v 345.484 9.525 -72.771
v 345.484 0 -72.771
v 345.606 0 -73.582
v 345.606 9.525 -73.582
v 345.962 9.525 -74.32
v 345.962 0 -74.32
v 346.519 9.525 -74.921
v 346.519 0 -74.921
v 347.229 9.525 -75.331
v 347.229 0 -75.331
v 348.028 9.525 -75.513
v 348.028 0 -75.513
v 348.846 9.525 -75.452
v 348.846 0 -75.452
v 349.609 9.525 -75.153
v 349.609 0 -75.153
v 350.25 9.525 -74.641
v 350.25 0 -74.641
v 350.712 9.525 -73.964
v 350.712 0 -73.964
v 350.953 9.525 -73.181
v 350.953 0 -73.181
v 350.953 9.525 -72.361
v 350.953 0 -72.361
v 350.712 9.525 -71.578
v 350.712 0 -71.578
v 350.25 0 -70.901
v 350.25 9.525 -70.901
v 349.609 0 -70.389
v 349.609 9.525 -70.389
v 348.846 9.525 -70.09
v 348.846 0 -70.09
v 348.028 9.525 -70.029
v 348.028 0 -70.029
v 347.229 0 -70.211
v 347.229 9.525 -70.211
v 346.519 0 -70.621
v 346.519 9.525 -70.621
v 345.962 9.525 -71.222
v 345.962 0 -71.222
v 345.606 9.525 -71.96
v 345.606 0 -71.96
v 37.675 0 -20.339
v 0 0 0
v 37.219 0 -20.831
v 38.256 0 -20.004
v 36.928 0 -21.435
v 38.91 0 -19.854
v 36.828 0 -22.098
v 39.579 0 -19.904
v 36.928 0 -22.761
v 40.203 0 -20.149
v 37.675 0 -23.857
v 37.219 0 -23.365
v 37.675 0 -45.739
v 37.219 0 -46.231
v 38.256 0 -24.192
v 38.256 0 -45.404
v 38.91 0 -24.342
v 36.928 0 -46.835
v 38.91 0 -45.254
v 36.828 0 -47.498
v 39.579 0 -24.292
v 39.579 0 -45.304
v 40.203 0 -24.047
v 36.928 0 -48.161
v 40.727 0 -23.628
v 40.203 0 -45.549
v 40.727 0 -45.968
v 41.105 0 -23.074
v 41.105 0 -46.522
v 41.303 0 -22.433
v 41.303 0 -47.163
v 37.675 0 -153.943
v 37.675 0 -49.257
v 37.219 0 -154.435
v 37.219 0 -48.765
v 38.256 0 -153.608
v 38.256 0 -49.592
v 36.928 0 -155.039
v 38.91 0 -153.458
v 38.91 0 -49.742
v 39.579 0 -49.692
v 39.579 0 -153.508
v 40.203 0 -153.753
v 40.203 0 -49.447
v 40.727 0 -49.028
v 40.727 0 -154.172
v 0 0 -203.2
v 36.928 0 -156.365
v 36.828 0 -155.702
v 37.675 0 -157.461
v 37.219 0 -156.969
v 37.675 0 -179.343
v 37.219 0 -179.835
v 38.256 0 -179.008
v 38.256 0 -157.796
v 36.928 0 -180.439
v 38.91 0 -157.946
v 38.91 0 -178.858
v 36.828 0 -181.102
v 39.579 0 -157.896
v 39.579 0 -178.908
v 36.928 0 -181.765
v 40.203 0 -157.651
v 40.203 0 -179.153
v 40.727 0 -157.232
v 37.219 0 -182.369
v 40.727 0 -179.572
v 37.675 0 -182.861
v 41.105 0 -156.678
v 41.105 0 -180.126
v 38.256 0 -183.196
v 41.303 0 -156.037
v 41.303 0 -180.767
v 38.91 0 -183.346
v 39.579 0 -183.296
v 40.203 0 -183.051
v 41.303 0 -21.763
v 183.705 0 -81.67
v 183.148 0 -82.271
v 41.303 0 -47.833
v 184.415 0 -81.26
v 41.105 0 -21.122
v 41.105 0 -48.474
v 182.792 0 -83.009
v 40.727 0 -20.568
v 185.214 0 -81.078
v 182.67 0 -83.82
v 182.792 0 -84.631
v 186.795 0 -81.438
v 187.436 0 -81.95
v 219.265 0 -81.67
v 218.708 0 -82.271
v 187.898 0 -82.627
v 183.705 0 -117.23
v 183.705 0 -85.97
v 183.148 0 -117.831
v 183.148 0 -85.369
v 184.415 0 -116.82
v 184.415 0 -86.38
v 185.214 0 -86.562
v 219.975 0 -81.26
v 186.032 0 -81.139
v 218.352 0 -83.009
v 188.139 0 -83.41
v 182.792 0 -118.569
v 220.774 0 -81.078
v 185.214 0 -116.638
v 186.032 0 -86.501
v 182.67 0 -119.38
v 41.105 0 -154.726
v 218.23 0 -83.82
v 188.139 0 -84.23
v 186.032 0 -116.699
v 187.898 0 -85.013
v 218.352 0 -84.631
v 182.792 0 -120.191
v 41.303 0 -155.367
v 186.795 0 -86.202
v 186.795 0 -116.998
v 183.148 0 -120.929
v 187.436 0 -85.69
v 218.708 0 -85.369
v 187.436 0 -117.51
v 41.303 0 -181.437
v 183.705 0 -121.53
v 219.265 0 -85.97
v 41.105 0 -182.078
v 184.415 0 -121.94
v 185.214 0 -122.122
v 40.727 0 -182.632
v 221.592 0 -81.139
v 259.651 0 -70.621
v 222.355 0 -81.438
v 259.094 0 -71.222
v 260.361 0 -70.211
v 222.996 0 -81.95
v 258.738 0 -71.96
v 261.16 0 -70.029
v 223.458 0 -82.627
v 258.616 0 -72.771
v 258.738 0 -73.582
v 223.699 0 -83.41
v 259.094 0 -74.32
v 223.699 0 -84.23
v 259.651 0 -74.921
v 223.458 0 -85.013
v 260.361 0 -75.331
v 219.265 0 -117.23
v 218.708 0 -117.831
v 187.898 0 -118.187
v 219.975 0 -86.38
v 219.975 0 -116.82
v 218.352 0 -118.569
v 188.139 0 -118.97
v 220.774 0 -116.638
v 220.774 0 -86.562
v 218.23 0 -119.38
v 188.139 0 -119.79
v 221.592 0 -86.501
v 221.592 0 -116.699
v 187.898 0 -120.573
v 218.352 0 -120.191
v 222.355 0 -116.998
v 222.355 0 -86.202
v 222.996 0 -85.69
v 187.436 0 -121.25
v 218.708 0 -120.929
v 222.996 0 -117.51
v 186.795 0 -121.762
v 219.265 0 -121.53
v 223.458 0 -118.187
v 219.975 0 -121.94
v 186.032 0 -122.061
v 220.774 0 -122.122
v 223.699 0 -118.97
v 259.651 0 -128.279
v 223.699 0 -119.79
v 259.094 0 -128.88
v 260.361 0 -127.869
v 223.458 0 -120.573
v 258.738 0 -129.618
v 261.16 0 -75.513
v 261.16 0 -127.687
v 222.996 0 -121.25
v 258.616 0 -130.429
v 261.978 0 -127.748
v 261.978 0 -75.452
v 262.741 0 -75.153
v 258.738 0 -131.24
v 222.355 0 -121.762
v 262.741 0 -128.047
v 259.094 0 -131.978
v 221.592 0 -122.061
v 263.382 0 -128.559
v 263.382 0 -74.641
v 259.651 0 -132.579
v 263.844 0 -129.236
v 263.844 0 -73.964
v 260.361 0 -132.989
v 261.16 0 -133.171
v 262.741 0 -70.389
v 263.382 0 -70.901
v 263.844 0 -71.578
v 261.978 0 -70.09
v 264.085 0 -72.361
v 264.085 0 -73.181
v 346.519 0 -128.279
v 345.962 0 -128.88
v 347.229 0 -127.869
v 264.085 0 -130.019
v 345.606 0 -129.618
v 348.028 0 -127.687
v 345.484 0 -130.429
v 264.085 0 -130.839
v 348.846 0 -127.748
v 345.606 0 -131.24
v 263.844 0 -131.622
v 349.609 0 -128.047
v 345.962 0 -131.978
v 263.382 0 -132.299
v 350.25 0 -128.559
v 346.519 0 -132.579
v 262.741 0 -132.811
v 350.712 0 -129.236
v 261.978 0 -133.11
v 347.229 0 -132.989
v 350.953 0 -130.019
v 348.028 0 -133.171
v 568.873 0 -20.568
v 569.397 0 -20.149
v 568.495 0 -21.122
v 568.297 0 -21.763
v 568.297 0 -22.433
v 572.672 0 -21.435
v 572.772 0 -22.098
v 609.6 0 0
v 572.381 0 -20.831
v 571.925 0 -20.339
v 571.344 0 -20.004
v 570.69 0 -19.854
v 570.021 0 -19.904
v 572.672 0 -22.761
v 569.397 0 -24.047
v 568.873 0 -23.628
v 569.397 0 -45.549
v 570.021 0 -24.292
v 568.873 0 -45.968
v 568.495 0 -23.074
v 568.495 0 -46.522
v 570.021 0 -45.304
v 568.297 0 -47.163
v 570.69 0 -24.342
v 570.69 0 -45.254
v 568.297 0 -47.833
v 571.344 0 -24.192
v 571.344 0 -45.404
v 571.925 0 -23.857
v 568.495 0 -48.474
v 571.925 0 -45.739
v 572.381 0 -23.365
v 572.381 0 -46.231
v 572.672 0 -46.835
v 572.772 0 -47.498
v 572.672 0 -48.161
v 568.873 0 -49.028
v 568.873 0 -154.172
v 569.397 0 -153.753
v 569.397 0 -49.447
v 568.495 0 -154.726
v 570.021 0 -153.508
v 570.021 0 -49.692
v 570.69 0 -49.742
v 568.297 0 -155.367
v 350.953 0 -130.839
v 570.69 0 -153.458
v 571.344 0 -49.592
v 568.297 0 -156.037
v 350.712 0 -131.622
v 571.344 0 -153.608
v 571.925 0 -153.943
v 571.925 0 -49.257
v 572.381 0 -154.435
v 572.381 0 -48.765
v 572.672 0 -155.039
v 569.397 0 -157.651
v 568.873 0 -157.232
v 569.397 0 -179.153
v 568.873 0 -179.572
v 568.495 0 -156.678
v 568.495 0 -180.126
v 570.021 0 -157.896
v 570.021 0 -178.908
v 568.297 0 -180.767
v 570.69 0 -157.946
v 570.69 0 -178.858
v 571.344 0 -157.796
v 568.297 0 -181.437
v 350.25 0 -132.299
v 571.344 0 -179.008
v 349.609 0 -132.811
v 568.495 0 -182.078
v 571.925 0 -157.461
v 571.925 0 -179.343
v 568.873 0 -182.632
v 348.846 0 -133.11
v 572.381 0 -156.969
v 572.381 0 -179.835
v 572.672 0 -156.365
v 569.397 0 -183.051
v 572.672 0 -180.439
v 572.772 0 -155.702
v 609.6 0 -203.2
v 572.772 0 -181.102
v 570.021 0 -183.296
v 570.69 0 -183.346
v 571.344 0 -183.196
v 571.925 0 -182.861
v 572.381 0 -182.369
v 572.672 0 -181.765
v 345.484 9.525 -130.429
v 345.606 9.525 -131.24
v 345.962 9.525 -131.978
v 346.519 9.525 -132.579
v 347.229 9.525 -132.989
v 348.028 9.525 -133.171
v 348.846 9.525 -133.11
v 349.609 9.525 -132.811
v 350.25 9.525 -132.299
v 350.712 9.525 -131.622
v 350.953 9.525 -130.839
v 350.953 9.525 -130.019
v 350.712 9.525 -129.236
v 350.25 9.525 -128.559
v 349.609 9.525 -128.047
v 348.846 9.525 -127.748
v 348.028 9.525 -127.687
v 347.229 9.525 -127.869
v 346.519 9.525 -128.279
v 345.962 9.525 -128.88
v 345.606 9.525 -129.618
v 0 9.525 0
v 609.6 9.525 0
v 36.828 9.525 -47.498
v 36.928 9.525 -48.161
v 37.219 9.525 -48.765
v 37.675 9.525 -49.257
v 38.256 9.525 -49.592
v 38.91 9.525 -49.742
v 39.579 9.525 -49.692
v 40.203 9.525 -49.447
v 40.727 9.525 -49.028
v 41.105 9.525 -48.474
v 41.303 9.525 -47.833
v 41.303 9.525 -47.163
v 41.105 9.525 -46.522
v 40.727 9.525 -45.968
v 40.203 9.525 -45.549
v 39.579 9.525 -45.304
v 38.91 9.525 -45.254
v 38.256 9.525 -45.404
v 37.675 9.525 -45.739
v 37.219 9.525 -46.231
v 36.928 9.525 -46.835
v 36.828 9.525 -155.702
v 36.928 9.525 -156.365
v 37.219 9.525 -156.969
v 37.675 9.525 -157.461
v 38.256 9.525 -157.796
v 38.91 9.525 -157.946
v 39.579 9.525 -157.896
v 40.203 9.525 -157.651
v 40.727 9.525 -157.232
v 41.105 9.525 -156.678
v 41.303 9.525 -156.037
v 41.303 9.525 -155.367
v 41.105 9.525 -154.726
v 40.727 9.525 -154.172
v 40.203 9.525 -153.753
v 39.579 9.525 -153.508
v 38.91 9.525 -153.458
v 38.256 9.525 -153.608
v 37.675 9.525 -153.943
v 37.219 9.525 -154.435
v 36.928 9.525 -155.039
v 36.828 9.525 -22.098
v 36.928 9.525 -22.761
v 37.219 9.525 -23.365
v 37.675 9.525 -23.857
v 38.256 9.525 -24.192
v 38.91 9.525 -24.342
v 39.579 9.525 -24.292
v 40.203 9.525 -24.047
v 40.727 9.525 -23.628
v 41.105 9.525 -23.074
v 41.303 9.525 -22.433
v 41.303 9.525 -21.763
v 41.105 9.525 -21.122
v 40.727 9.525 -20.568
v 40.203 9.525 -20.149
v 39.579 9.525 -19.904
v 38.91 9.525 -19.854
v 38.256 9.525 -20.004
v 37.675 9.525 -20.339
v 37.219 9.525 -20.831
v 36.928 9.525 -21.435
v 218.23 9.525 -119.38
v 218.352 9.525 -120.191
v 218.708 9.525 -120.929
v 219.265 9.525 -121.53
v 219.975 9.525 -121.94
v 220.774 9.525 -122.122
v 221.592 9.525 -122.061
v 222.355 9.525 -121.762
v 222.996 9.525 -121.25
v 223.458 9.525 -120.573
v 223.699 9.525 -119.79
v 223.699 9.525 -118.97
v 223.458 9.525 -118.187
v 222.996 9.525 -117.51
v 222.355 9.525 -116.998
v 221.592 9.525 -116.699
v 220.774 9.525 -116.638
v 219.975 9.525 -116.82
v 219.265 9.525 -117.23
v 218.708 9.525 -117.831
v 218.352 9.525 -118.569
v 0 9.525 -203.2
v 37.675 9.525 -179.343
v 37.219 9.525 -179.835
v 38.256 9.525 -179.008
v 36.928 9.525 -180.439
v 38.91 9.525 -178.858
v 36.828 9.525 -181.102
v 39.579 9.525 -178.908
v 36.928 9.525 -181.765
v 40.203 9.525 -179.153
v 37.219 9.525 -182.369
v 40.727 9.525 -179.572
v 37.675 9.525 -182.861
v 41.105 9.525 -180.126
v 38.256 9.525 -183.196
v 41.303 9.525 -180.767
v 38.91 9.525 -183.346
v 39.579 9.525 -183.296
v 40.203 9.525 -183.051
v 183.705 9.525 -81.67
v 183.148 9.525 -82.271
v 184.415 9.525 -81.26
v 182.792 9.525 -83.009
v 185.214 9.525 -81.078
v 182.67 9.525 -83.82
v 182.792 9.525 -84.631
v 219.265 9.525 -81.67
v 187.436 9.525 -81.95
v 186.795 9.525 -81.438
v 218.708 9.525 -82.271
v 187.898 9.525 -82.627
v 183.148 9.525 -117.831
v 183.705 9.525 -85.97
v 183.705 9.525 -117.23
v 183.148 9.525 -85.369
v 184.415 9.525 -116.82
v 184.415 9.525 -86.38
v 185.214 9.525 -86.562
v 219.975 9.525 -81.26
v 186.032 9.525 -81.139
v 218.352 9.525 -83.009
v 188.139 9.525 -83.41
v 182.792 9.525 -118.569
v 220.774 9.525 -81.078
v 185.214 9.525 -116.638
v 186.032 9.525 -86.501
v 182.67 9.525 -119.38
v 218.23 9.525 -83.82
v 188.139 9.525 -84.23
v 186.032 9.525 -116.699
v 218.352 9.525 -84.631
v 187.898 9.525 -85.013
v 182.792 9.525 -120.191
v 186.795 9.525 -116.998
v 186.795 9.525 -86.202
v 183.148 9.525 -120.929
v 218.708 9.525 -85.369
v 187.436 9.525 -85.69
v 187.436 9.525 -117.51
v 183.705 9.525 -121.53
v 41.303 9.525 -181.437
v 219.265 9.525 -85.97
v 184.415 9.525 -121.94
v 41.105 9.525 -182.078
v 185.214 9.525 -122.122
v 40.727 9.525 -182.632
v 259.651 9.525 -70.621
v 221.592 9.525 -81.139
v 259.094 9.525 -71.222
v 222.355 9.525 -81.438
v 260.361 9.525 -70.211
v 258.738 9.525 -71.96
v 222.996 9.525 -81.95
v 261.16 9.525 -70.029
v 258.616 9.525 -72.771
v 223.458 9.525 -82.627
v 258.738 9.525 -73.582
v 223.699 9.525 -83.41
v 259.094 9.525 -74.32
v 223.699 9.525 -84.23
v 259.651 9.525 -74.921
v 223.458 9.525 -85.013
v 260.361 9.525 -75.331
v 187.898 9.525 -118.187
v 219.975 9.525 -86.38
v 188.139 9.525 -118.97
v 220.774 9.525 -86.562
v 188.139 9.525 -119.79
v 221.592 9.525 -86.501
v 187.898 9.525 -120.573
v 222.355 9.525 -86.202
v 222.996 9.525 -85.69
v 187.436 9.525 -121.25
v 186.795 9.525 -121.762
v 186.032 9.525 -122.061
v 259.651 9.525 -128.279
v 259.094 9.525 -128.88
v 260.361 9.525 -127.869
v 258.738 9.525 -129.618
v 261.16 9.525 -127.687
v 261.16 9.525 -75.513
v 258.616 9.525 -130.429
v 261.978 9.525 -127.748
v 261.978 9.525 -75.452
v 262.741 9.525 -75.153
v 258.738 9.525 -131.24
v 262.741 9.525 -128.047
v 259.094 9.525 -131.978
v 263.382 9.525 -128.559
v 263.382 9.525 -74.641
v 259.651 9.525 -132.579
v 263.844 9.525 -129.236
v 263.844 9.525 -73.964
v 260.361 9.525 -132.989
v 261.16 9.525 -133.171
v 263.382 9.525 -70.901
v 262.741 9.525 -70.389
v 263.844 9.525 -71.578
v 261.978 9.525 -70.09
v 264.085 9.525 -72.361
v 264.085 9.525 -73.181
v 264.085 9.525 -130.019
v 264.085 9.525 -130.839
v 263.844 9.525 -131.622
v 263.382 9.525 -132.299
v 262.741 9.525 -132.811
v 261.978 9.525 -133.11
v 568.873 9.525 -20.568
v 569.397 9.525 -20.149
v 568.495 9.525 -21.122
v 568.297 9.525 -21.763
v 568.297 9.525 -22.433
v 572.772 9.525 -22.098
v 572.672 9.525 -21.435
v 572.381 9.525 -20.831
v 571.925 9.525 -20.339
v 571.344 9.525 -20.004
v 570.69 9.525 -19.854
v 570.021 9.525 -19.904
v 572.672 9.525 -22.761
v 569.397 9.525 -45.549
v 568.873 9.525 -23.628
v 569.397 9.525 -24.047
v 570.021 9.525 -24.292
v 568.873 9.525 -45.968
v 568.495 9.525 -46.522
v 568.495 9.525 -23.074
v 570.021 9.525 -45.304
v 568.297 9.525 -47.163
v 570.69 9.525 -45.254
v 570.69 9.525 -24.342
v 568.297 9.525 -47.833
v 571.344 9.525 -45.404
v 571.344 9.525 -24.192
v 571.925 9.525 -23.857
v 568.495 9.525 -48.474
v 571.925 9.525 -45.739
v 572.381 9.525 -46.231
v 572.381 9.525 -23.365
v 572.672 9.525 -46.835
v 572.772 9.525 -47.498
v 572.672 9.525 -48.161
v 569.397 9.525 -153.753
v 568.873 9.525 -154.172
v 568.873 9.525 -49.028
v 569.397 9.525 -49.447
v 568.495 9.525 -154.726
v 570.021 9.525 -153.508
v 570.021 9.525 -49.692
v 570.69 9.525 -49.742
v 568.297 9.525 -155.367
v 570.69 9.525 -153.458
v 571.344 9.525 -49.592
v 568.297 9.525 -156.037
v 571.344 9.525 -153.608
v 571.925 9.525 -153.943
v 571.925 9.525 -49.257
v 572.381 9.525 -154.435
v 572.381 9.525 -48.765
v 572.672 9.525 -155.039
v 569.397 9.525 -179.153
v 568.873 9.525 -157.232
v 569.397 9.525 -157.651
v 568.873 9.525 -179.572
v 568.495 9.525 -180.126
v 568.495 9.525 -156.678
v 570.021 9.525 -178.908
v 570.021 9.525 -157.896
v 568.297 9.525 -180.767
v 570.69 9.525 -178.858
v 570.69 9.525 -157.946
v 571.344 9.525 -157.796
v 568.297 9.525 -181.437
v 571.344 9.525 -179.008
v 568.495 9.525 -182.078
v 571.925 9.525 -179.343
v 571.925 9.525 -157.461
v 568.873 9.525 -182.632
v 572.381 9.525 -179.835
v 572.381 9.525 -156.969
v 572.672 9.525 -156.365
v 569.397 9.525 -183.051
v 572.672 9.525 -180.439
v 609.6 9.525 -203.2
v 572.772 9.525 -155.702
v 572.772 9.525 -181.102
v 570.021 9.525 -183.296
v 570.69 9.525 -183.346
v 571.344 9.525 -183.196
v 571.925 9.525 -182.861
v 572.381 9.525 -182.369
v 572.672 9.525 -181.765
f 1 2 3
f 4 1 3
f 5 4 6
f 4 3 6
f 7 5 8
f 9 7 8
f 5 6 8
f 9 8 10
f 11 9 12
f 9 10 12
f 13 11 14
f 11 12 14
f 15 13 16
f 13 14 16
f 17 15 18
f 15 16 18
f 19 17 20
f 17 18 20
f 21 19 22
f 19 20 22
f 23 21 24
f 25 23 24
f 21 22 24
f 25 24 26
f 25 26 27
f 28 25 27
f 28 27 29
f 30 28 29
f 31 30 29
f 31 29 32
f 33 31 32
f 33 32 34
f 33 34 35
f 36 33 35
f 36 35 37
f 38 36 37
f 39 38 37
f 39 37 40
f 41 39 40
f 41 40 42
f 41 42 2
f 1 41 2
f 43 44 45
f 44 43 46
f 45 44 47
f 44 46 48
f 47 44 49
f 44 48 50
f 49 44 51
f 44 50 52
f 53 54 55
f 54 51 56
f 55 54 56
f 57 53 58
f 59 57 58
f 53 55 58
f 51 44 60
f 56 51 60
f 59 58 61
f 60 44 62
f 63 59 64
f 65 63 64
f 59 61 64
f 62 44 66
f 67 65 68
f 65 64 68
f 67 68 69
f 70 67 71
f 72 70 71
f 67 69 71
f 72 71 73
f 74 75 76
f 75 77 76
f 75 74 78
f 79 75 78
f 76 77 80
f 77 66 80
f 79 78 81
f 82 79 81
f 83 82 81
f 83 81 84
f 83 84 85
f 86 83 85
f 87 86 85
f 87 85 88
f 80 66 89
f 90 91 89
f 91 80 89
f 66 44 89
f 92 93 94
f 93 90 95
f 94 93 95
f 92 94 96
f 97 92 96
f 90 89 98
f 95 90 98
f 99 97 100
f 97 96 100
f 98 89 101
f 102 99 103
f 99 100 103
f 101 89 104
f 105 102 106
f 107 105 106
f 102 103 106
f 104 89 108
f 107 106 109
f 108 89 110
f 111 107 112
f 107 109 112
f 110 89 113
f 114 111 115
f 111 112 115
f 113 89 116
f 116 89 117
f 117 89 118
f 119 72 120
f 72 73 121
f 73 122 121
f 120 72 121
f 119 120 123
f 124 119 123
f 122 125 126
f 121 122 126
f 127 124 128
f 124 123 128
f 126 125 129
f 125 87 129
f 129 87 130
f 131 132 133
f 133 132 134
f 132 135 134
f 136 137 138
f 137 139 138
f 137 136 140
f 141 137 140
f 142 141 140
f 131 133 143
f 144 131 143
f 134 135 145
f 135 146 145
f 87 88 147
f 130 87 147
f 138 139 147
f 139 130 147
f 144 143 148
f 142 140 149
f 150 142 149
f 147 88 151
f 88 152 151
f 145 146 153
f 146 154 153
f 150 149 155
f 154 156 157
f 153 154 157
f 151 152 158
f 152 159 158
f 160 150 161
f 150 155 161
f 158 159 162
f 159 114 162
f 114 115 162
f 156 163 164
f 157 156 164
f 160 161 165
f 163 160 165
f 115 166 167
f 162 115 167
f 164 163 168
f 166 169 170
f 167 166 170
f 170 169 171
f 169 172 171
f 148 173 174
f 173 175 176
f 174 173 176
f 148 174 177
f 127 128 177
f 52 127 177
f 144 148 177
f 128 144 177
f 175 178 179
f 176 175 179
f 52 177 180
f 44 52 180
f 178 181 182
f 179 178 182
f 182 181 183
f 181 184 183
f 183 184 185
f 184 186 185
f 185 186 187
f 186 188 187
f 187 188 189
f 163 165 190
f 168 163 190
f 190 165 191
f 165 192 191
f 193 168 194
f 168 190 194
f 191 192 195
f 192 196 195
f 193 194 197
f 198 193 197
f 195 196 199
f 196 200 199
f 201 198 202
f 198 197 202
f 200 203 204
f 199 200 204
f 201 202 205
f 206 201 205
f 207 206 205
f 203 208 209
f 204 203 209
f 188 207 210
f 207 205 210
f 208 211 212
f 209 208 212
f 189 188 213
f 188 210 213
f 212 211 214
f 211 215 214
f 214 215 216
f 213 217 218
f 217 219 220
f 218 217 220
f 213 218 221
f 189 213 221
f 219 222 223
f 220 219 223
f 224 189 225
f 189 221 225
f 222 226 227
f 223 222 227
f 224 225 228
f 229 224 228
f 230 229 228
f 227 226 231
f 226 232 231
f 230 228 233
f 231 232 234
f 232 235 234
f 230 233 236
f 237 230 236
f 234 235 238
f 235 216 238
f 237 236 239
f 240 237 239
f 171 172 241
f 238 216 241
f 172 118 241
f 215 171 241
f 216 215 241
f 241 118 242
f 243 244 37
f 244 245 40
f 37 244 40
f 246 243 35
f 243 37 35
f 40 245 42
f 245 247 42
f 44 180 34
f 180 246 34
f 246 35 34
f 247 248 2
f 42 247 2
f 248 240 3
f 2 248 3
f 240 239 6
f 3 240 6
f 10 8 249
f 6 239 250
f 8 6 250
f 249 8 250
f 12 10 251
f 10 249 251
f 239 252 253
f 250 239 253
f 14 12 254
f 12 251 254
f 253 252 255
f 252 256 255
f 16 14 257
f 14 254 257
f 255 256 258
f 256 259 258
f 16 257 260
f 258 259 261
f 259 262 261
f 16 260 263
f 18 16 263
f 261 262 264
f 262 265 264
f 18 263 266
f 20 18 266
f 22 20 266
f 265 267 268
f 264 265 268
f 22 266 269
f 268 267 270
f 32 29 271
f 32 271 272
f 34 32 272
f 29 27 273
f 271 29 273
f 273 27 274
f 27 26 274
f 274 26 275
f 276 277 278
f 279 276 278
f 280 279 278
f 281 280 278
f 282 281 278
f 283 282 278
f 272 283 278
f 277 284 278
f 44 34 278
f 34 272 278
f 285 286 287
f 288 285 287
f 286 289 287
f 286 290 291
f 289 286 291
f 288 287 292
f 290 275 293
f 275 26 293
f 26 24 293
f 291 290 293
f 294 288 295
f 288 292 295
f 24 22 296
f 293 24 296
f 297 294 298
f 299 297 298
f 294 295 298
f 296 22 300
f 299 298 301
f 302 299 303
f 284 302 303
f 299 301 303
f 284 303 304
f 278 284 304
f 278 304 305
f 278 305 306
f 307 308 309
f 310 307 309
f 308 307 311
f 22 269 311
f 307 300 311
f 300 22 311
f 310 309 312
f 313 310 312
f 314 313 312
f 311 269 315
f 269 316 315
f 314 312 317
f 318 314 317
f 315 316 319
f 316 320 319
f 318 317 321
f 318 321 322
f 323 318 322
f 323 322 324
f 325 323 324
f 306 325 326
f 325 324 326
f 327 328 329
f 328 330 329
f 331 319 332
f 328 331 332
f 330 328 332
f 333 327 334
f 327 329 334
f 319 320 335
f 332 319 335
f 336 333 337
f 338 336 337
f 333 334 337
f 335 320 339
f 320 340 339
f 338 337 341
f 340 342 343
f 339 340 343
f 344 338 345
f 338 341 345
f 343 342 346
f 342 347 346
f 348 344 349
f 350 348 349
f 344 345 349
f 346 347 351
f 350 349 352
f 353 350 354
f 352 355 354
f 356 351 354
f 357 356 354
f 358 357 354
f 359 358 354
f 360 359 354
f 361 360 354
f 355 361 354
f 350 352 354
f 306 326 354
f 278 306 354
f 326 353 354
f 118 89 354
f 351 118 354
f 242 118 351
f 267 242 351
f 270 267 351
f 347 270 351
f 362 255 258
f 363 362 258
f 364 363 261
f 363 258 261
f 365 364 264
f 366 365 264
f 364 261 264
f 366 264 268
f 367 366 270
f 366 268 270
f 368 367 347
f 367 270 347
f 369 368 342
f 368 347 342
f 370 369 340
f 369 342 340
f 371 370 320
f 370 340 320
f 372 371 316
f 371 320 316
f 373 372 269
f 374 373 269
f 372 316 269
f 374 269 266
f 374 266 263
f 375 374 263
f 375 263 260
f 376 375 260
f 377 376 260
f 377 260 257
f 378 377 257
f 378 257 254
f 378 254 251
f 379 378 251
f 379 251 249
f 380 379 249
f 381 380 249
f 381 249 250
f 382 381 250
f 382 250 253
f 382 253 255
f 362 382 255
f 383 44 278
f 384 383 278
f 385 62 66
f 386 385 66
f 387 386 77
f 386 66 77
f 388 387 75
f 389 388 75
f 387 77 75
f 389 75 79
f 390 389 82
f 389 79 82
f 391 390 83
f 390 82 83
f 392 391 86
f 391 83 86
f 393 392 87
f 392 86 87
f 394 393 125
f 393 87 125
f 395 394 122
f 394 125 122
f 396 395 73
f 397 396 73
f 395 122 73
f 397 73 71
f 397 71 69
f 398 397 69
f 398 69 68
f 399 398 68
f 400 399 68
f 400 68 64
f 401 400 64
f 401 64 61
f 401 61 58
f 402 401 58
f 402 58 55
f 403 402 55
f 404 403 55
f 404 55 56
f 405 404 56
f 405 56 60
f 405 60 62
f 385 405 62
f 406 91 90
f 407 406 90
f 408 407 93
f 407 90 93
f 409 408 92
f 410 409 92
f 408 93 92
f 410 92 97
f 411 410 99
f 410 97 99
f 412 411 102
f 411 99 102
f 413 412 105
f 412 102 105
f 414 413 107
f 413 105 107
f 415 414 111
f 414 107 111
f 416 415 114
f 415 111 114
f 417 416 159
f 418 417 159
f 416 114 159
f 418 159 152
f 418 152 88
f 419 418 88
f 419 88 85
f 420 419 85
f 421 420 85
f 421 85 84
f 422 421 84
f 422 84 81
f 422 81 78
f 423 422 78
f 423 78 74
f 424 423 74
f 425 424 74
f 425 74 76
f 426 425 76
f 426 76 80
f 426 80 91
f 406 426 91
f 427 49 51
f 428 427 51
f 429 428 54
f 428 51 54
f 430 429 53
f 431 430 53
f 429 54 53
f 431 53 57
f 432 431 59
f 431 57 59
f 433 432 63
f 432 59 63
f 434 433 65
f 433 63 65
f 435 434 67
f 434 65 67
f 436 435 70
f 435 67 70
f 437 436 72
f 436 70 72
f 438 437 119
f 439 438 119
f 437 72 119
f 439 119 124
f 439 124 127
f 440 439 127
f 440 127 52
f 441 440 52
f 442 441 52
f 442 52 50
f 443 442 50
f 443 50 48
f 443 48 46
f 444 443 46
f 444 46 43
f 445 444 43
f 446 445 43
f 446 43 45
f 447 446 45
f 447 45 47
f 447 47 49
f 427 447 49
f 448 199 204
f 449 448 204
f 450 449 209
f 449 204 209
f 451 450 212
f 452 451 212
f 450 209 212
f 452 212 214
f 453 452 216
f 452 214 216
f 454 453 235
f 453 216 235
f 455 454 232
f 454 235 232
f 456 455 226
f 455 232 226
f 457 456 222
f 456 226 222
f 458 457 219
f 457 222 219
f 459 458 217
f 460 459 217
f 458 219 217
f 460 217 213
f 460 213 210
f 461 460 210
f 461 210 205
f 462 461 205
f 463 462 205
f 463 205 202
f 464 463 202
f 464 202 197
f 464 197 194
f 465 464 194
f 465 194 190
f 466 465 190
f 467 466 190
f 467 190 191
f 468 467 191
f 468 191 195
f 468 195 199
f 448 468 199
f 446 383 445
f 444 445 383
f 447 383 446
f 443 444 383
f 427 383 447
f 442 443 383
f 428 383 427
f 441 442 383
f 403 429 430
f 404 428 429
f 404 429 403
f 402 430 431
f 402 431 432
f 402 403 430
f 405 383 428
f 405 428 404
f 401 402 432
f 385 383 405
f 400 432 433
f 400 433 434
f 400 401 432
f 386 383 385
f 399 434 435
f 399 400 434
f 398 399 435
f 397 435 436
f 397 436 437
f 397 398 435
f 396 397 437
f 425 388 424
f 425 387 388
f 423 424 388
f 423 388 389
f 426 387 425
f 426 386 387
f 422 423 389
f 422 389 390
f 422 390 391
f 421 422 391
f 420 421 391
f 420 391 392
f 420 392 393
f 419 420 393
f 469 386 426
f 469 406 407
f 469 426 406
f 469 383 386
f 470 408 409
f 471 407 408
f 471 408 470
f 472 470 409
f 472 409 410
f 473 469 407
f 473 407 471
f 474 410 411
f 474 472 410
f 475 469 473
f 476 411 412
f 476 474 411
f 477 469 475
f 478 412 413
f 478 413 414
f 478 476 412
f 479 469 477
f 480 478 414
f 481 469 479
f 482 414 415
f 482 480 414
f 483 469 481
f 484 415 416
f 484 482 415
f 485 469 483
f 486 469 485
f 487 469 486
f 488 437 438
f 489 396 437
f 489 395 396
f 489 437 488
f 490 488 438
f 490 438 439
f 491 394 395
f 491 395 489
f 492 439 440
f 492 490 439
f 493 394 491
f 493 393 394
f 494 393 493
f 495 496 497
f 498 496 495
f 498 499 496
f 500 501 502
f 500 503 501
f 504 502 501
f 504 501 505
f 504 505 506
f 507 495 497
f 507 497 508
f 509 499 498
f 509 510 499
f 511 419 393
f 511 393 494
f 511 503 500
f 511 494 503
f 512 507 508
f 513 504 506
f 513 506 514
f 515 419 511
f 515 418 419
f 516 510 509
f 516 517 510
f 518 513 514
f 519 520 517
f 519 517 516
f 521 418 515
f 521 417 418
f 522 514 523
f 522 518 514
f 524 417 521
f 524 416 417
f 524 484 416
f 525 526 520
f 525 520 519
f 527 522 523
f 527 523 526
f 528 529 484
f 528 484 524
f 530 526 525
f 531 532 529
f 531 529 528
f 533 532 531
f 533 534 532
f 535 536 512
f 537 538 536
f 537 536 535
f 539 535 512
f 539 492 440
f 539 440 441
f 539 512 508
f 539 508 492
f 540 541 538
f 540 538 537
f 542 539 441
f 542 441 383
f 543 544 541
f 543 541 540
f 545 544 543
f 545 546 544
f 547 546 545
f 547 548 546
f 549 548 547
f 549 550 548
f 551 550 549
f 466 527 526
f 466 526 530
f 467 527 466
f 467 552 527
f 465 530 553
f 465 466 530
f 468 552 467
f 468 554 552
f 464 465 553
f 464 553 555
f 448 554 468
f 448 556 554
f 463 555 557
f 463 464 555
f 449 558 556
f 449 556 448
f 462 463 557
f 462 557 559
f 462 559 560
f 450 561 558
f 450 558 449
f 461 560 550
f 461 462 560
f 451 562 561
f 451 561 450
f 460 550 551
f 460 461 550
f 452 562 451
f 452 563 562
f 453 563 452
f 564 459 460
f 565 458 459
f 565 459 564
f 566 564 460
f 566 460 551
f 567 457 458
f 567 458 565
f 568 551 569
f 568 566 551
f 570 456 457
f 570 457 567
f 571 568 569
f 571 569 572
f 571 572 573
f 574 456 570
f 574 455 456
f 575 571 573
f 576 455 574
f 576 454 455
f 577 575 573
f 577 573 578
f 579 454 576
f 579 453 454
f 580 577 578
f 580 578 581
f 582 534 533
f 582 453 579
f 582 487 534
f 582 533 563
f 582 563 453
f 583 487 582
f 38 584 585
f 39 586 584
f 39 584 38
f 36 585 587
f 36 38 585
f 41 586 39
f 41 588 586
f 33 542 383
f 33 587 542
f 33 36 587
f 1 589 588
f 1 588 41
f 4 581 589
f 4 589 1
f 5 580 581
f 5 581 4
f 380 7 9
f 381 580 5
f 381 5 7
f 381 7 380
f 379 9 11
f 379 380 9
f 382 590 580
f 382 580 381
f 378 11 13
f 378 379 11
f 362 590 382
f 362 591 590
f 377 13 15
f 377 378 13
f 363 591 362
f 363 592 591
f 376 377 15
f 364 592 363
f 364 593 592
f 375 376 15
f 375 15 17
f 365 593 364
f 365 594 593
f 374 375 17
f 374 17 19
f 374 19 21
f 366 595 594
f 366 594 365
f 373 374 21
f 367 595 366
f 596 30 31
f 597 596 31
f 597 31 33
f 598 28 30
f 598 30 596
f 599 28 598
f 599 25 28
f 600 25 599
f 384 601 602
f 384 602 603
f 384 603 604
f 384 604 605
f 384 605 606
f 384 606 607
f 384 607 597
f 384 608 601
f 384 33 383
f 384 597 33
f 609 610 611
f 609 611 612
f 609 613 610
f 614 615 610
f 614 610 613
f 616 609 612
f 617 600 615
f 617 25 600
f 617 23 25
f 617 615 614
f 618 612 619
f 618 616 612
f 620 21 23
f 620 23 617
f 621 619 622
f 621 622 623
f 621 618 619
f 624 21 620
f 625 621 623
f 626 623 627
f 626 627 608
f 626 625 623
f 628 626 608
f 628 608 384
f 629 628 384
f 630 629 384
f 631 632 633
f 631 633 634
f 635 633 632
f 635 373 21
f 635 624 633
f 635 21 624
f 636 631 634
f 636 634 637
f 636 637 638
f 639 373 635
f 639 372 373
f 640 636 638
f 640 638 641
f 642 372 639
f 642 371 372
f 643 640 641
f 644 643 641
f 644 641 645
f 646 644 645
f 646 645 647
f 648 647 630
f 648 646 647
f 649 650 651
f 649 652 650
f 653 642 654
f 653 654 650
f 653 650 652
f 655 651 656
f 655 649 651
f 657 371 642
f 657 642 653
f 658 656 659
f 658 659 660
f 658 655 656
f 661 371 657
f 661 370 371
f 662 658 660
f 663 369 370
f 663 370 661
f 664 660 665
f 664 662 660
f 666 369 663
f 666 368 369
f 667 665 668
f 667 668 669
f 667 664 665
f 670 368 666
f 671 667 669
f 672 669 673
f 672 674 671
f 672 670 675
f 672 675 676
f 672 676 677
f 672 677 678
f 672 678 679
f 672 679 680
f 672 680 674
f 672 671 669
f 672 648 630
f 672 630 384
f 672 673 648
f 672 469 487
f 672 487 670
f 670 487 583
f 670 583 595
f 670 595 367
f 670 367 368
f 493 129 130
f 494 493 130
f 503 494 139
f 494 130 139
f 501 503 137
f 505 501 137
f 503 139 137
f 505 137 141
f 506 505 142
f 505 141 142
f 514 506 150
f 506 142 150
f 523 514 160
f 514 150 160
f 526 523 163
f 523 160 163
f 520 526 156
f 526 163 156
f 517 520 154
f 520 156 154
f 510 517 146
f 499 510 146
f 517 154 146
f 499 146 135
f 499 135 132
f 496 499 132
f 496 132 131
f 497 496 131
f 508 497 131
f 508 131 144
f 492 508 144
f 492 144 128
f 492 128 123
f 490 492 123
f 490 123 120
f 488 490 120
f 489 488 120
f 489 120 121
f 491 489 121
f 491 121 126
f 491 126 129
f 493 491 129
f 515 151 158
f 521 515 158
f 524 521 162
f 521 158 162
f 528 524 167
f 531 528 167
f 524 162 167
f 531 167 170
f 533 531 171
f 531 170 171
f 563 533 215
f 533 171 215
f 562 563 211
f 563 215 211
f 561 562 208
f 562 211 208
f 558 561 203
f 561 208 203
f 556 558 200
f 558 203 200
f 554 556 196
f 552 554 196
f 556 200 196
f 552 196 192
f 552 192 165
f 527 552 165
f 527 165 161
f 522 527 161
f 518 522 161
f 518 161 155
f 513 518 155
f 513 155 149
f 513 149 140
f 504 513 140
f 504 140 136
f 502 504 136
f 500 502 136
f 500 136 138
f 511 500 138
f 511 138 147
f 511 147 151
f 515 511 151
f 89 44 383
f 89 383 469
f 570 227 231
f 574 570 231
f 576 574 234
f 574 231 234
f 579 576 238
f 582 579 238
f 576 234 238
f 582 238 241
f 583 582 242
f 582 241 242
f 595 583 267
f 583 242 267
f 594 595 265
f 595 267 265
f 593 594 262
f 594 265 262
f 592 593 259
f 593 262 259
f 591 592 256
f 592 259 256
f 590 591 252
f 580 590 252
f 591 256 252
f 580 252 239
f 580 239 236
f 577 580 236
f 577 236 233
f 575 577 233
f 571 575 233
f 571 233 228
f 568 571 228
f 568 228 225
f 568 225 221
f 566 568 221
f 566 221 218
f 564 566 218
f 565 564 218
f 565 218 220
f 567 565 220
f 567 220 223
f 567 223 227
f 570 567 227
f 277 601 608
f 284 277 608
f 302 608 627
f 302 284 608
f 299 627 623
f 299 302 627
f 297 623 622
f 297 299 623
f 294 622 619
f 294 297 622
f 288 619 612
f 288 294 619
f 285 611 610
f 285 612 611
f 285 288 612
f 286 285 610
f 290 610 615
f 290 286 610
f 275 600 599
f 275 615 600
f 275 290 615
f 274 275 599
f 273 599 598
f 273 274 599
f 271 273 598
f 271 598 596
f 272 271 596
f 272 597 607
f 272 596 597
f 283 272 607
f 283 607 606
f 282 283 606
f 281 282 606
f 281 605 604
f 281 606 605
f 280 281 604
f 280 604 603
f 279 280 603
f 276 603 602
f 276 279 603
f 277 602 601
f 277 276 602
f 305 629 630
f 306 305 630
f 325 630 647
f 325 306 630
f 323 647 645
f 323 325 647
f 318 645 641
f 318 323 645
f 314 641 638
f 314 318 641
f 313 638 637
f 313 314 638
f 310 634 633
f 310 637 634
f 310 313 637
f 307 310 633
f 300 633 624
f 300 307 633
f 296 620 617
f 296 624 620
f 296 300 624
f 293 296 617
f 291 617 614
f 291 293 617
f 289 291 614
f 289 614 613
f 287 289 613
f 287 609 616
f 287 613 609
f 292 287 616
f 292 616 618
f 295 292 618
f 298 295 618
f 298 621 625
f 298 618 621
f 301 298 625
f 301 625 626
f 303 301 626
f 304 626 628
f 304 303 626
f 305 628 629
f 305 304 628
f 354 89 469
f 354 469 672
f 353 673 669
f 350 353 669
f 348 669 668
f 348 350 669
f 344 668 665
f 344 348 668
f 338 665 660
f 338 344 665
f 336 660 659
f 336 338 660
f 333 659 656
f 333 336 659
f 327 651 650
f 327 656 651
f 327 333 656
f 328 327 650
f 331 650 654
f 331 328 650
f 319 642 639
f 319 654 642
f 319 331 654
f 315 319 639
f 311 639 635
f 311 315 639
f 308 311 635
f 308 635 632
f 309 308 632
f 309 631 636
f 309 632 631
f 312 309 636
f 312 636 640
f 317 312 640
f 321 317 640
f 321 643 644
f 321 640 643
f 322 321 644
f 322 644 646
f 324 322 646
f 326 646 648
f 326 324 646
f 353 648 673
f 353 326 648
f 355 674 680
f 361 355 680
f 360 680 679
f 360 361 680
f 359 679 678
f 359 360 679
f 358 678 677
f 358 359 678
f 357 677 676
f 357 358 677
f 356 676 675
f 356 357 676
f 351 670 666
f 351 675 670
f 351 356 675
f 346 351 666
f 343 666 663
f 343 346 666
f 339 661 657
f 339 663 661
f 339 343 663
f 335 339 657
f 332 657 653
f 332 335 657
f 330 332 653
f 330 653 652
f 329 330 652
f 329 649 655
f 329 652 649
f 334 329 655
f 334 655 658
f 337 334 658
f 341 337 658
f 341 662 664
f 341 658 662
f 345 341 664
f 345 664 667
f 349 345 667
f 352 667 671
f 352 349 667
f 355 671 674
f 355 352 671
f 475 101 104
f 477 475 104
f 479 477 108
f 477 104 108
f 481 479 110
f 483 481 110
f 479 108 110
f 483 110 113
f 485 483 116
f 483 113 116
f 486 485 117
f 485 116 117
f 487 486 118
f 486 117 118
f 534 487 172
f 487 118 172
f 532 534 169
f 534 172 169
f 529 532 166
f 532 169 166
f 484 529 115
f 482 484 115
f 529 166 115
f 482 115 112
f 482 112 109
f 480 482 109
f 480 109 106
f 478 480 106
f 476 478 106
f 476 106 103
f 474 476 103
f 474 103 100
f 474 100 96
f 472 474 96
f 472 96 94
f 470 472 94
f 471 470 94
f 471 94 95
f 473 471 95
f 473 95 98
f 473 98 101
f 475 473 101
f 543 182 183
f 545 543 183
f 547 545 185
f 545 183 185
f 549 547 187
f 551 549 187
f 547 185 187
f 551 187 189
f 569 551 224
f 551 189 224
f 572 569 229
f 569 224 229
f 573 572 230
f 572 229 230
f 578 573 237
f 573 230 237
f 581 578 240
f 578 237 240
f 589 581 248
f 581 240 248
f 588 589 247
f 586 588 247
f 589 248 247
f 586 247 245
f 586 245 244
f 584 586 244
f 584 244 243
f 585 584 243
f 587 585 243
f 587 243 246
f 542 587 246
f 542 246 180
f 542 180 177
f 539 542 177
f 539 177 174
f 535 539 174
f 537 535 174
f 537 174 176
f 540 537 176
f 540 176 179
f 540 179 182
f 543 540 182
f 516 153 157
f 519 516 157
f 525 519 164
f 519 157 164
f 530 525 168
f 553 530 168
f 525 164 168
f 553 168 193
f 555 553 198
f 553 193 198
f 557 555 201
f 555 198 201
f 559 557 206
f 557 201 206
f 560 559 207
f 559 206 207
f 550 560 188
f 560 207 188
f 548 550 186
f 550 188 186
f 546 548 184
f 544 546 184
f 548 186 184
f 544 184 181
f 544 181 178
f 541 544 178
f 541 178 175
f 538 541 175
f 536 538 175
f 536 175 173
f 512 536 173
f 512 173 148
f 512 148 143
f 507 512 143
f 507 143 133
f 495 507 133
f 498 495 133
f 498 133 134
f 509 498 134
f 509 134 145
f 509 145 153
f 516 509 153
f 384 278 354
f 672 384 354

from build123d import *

# Parameters (mm, degrees)
SKETCH1_W                  = 609.6
SKETCH1_H                  = 203.2
TABLE_BLANK_DEPTH          = 9.525
TABLE_HOLES_M5_CLEARANCE_D = 5.5
RUNNER_HOLES_D             = 5.5
WHEEL_HOLES_M4_CLEARANCE_D = 4.5


with BuildPart() as part:
    # Sketch1 → Table Blank (new body)
    with BuildSketch(Plane(origin=(0, 0, 0), x_dir=(1, 0, 0), z_dir=(0, 1, 0))):
        with Locations((304.8, 101.6)):
            Rectangle(SKETCH1_W, SKETCH1_H)
    extrude(amount=TABLE_BLANK_DEPTH)

    # Table Holes (M5 Clearance) (through all)
    with Locations(Plane(origin=(0, 9.525, 0), x_dir=(1, 0, 0), z_dir=(0, 1, 0))):
        with Locations((261.366, 130.429), (348.234, 130.429), (348.234, 72.771), (261.366, 72.771)):
            Hole(TABLE_HOLES_M5_CLEARANCE_D / 2)

    # Runner Holes (through all)
    with Locations(Plane(origin=(0, 9.525, 0), x_dir=(1, 0, 0), z_dir=(0, 1, 0))):
        with Locations((185.42, 119.38), (220.98, 119.38), (220.98, 83.82), (185.42, 83.82)):
            Hole(RUNNER_HOLES_D / 2)

    # Wheel Holes (M4 Clearance) (through all)
    with Locations(Plane(origin=(0, 9.525, 0), x_dir=(1, 0, 0), z_dir=(0, 1, 0))):
        with Locations((39.0779, 181.102), (39.0779, 155.702), (39.0779, 47.498), (39.0779, 22.098)):
            wheel_holes_m4_clearance = Hole(WHEEL_HOLES_M4_CLEARANCE_D / 2)

    # Mirror1: Wheel Holes (M4 Clearance) across plane
    add(wheel_holes_m4_clearance.mirror(Plane.ZY.offset(-304.8)), mode=Mode.SUBTRACT)


solid = part.part
